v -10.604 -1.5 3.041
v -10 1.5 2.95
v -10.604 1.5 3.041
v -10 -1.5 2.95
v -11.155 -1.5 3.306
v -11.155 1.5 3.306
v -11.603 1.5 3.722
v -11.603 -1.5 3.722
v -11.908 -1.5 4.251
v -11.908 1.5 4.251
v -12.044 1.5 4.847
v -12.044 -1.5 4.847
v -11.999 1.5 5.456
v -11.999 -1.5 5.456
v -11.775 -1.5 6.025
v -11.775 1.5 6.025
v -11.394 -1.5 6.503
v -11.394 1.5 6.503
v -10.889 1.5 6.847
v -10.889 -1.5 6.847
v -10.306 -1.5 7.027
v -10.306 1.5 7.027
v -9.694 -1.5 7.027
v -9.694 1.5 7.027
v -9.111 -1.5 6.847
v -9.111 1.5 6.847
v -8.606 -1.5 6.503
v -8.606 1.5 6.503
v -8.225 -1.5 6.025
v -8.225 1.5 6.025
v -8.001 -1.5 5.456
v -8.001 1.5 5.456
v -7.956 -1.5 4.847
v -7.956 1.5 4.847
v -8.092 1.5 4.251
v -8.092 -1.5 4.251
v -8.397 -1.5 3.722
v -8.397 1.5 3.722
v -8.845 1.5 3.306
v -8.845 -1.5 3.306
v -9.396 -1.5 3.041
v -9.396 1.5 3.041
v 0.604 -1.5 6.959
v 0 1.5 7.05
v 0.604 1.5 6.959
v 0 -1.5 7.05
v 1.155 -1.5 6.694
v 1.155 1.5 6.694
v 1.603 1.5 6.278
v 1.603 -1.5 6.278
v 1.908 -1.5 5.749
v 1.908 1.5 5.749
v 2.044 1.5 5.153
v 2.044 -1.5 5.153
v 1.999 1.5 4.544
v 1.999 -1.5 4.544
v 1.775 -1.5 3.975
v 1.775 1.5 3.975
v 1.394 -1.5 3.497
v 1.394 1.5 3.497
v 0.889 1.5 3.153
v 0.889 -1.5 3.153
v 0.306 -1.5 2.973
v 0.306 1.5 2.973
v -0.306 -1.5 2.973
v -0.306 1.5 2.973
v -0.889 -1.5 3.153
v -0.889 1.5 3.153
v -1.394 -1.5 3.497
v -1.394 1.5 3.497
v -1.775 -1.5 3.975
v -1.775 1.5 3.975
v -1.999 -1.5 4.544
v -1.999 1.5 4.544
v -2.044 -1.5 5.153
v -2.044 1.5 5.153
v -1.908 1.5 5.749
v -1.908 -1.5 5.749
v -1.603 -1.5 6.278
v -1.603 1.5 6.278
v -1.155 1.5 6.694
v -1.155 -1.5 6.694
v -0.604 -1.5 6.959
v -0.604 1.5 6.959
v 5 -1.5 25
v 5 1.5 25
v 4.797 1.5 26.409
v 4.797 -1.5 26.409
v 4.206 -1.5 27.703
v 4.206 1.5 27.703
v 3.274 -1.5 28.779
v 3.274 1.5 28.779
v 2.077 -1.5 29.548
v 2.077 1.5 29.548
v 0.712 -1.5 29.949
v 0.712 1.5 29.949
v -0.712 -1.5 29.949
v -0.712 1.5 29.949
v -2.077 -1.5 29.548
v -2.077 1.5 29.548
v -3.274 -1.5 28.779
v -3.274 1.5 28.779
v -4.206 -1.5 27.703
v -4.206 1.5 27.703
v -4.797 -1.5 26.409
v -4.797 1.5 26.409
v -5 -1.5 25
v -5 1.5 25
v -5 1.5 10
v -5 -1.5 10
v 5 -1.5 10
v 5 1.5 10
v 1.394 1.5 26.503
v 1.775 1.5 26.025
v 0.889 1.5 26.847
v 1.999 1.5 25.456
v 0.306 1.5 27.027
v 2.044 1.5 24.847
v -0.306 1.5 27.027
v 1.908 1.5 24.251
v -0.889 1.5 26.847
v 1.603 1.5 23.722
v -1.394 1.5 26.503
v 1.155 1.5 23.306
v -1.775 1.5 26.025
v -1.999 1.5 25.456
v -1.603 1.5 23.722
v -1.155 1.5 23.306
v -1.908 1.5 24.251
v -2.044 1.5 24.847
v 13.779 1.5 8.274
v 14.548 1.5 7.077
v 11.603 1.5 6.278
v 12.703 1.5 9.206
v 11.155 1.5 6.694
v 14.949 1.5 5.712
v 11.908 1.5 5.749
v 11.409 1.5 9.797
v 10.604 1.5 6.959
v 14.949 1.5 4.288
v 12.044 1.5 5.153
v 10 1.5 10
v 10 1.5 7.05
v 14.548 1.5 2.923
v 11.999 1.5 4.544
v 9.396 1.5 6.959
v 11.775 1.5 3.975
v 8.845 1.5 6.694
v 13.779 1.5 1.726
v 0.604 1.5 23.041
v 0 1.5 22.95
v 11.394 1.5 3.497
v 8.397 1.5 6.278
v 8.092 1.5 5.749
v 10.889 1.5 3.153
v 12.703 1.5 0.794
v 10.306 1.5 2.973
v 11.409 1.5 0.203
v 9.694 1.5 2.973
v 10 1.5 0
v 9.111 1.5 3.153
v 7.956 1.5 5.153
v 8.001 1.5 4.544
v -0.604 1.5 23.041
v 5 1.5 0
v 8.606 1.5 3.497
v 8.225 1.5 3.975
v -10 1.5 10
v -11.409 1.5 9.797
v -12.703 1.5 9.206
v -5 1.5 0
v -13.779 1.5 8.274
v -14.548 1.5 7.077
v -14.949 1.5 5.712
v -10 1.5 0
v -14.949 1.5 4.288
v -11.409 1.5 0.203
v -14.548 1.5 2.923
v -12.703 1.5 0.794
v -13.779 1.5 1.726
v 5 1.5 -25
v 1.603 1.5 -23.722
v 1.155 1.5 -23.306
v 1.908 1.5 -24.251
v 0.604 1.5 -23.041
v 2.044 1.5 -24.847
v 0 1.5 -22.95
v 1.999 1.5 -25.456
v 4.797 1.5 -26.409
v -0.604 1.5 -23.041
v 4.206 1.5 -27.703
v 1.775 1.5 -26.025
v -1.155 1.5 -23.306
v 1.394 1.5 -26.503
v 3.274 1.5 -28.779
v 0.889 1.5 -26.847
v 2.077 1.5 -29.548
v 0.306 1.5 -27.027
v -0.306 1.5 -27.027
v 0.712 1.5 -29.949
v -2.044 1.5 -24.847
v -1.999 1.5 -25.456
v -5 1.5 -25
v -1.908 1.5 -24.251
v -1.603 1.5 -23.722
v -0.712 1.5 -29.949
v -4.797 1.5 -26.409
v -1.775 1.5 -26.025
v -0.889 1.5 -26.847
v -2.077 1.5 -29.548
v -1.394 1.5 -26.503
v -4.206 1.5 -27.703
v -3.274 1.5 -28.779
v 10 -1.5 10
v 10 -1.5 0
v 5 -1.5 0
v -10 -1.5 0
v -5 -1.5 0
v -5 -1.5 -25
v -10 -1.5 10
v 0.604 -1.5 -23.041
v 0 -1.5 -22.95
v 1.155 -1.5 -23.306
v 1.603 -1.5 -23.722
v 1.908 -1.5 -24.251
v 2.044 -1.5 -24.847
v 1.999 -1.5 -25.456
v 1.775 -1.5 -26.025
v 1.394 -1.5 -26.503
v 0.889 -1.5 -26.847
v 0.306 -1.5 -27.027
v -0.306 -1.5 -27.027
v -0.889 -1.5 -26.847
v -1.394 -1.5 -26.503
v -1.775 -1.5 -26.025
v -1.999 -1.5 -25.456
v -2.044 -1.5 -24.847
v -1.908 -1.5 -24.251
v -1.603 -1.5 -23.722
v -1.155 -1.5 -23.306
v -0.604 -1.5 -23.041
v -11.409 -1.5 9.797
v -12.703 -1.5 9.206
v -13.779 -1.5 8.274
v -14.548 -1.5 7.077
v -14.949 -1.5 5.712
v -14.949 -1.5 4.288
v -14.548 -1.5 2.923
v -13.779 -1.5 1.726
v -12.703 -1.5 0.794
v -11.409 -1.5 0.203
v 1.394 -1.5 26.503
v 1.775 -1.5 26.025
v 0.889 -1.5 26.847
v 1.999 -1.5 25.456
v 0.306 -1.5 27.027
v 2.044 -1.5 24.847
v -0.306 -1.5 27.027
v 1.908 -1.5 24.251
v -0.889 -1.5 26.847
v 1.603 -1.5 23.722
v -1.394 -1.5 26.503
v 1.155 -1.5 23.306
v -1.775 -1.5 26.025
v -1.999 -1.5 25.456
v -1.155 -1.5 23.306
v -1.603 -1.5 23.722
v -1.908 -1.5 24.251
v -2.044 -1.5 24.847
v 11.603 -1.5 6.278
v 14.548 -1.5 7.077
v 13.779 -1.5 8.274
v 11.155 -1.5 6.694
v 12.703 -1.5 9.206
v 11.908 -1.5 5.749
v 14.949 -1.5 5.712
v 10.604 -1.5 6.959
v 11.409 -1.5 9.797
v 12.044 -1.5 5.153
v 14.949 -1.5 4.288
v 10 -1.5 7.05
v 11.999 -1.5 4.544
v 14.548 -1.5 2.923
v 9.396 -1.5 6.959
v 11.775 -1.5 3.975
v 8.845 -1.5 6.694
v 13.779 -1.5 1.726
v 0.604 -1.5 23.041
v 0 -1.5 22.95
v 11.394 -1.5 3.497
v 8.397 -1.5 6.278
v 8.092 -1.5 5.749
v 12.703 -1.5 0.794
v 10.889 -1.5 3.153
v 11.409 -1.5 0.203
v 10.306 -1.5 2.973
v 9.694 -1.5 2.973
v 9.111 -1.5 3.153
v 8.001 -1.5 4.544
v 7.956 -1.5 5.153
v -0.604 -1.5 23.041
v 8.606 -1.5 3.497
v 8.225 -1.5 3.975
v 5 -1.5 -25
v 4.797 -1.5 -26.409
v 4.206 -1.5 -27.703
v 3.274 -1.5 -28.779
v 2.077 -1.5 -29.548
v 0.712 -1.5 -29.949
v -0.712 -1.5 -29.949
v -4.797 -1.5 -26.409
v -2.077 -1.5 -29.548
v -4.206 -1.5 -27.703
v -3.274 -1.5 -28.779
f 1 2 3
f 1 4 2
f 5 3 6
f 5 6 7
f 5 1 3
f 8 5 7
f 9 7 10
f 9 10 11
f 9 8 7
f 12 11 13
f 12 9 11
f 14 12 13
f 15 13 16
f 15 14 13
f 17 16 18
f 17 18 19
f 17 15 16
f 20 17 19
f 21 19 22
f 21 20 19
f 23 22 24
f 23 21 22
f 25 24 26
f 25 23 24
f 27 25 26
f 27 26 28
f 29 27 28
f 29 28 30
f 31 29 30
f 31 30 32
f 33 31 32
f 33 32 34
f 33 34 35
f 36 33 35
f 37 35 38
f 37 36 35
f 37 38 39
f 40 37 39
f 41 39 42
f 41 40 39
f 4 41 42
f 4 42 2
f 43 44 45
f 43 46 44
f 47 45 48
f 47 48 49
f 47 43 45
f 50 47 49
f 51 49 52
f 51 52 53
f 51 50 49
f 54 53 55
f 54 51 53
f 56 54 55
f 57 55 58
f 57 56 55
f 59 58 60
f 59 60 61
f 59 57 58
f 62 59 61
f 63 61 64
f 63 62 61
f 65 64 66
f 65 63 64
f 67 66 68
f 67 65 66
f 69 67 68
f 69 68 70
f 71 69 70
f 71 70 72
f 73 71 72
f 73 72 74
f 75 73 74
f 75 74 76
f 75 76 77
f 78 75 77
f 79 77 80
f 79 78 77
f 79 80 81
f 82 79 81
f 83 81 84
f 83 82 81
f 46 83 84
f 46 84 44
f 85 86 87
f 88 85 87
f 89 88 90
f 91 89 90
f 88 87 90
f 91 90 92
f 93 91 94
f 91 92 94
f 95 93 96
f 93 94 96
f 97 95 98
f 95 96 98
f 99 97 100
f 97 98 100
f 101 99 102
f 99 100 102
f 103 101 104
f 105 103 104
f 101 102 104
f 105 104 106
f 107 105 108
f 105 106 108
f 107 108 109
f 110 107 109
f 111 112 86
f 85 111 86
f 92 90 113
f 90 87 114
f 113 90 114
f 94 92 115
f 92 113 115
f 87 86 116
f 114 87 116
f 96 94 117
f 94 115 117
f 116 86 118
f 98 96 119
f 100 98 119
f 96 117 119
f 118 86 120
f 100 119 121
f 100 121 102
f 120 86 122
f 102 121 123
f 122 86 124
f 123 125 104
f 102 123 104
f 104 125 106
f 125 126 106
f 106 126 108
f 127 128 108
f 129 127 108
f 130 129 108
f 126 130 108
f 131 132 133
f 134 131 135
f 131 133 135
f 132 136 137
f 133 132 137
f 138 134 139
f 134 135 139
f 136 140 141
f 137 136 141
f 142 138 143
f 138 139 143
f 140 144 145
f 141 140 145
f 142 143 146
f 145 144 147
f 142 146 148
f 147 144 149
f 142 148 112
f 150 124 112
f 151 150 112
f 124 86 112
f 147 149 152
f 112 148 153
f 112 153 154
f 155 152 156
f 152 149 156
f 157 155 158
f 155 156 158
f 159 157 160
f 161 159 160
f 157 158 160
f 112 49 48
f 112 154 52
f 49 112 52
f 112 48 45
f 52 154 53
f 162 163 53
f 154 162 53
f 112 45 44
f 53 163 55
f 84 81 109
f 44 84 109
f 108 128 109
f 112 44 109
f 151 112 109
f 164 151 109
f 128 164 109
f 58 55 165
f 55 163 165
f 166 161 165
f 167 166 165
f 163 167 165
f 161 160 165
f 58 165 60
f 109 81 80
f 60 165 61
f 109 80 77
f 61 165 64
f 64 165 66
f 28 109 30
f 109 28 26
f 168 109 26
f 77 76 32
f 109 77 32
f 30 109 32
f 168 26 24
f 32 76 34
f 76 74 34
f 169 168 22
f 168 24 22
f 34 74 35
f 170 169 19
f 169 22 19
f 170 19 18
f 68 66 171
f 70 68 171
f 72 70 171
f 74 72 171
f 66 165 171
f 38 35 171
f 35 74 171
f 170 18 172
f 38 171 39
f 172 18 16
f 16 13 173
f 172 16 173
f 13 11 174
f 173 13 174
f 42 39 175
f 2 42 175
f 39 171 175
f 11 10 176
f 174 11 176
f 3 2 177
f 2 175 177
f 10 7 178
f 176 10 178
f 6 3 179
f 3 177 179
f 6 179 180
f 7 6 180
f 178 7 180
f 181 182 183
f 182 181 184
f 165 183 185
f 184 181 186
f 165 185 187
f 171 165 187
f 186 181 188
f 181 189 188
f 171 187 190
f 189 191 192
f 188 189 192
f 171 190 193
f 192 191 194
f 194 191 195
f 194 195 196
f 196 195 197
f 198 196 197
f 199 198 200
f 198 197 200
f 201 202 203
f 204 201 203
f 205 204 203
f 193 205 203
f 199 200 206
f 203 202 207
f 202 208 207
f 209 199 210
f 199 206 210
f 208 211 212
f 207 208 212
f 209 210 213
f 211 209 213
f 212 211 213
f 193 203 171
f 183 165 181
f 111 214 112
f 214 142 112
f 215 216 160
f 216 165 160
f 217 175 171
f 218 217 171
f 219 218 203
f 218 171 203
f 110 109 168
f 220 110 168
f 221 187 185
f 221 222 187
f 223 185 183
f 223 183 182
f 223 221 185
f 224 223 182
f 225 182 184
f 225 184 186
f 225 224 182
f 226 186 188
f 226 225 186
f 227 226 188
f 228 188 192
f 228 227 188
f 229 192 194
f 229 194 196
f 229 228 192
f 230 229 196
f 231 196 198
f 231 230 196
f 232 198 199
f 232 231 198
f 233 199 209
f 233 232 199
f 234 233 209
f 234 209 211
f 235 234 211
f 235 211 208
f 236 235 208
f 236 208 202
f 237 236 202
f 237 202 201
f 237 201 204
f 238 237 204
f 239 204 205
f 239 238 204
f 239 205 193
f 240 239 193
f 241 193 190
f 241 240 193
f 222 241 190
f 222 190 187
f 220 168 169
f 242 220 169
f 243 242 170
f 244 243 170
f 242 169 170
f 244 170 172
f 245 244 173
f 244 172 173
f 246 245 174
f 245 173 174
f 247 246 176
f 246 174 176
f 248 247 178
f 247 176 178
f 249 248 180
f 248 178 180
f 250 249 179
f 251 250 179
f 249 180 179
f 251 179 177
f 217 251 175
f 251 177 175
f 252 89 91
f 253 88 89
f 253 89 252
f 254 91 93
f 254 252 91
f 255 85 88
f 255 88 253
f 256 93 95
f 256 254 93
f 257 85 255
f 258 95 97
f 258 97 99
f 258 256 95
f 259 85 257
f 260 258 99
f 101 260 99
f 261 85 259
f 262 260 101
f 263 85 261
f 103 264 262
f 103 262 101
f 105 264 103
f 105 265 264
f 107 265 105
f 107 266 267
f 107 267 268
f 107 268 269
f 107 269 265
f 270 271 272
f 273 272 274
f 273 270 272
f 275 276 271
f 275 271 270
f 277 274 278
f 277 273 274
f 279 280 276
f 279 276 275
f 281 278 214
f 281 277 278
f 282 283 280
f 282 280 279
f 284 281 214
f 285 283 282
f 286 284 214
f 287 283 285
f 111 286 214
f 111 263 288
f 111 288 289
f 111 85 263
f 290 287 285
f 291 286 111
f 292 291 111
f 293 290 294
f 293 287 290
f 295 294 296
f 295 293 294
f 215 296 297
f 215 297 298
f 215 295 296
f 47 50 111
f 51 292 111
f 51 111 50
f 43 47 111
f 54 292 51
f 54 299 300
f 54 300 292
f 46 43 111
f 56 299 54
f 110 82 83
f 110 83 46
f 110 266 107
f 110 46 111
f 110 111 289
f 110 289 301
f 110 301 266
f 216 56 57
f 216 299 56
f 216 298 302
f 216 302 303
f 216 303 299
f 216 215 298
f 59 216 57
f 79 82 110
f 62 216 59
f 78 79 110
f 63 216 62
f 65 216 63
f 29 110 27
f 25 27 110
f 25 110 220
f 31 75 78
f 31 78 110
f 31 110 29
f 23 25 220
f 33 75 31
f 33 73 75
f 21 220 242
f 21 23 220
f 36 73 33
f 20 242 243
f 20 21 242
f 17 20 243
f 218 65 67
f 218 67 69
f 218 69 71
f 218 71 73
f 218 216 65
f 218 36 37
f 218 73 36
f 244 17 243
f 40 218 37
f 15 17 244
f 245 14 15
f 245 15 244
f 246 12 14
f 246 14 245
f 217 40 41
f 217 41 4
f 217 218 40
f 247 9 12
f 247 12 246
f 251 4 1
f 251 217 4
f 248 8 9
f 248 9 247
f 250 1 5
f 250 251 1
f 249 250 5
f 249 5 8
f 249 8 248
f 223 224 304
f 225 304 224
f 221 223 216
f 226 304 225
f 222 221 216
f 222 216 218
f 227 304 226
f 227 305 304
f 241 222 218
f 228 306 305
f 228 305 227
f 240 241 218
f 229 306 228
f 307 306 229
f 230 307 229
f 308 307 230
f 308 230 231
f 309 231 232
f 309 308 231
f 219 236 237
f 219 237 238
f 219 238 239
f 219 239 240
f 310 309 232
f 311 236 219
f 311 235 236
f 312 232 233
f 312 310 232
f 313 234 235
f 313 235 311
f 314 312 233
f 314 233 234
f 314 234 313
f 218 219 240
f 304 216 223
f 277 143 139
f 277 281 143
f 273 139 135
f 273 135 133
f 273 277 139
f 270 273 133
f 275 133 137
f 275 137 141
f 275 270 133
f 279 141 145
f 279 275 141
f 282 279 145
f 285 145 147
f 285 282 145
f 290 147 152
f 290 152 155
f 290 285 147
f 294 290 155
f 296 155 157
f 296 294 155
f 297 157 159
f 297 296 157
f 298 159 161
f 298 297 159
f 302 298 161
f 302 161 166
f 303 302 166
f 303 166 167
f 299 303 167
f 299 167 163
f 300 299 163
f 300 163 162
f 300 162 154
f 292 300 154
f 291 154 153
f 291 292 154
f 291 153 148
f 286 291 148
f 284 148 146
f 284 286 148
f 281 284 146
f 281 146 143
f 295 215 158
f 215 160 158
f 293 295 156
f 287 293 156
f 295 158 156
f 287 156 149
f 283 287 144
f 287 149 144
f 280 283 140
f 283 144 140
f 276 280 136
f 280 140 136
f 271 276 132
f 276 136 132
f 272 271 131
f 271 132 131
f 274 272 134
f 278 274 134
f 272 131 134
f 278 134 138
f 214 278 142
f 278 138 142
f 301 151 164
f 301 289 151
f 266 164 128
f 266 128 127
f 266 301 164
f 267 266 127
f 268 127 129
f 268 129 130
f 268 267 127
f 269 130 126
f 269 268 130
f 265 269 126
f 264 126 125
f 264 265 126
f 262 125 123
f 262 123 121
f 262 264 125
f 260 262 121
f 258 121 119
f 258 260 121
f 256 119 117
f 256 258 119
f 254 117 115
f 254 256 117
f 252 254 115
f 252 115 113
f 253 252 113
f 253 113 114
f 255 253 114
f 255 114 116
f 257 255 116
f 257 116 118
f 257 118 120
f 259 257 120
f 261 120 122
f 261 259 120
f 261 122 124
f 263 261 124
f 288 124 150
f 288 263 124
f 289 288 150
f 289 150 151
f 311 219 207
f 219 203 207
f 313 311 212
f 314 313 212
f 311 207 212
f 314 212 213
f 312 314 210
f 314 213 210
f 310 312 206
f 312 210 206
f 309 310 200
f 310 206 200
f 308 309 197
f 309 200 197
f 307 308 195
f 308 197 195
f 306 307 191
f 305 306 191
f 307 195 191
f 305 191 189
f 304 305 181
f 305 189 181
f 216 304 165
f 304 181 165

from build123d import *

# Parameters (mm, degrees)
SKETCH1_R           = 2.05
BOSS_EXTRUDE1_DEPTH = 1.5


with BuildPart() as part:
    # Sketch1 → Boss-Extrude1 (new, symmetric)
    with BuildSketch(Plane(origin=(0, 0, 0), x_dir=(1, 0, 0), z_dir=(0, 1, 0))):
        with BuildLine():
            Line((-10, 0), (-5, 0))
            Line((-5, 0), (-5, 25))
            ThreePointArc((-5, 25), (0, 30), (5, 25))
            Line((5, 25), (5, 0))
            Line((5, 0), (10, 0))
            ThreePointArc((10, 0), (15, -5), (10, -10))
            Line((10, -10), (5, -10))
            Line((5, -10), (5, -25))
            ThreePointArc((5, -25), (0, -30), (-5, -25))
            Line((-5, -25), (-5, -10))
            Line((-5, -10), (-10, -10))
            ThreePointArc((-10, -10), (-15, -5), (-10, 0))
        make_face()
        with Locations(Location((10, -5, 0), (0, 0, 270))):
            Circle(SKETCH1_R, mode=Mode.SUBTRACT)
        with Locations(Location((-10, -5, 0), (0, 0, 90))):
            Circle(SKETCH1_R, mode=Mode.SUBTRACT)
        with Locations(Location((0, -5, 0), (0, 0, 270))):
            Circle(SKETCH1_R, mode=Mode.SUBTRACT)
        with Locations(Location((0, 25, 0), (0, 0, 270))):
            Circle(SKETCH1_R, mode=Mode.SUBTRACT)
        with Locations(Location((0, -25, 0), (0, 0, 90))):
            Circle(SKETCH1_R, mode=Mode.SUBTRACT)
    extrude(amount=BOSS_EXTRUDE1_DEPTH, both=True)


solid = part.part
